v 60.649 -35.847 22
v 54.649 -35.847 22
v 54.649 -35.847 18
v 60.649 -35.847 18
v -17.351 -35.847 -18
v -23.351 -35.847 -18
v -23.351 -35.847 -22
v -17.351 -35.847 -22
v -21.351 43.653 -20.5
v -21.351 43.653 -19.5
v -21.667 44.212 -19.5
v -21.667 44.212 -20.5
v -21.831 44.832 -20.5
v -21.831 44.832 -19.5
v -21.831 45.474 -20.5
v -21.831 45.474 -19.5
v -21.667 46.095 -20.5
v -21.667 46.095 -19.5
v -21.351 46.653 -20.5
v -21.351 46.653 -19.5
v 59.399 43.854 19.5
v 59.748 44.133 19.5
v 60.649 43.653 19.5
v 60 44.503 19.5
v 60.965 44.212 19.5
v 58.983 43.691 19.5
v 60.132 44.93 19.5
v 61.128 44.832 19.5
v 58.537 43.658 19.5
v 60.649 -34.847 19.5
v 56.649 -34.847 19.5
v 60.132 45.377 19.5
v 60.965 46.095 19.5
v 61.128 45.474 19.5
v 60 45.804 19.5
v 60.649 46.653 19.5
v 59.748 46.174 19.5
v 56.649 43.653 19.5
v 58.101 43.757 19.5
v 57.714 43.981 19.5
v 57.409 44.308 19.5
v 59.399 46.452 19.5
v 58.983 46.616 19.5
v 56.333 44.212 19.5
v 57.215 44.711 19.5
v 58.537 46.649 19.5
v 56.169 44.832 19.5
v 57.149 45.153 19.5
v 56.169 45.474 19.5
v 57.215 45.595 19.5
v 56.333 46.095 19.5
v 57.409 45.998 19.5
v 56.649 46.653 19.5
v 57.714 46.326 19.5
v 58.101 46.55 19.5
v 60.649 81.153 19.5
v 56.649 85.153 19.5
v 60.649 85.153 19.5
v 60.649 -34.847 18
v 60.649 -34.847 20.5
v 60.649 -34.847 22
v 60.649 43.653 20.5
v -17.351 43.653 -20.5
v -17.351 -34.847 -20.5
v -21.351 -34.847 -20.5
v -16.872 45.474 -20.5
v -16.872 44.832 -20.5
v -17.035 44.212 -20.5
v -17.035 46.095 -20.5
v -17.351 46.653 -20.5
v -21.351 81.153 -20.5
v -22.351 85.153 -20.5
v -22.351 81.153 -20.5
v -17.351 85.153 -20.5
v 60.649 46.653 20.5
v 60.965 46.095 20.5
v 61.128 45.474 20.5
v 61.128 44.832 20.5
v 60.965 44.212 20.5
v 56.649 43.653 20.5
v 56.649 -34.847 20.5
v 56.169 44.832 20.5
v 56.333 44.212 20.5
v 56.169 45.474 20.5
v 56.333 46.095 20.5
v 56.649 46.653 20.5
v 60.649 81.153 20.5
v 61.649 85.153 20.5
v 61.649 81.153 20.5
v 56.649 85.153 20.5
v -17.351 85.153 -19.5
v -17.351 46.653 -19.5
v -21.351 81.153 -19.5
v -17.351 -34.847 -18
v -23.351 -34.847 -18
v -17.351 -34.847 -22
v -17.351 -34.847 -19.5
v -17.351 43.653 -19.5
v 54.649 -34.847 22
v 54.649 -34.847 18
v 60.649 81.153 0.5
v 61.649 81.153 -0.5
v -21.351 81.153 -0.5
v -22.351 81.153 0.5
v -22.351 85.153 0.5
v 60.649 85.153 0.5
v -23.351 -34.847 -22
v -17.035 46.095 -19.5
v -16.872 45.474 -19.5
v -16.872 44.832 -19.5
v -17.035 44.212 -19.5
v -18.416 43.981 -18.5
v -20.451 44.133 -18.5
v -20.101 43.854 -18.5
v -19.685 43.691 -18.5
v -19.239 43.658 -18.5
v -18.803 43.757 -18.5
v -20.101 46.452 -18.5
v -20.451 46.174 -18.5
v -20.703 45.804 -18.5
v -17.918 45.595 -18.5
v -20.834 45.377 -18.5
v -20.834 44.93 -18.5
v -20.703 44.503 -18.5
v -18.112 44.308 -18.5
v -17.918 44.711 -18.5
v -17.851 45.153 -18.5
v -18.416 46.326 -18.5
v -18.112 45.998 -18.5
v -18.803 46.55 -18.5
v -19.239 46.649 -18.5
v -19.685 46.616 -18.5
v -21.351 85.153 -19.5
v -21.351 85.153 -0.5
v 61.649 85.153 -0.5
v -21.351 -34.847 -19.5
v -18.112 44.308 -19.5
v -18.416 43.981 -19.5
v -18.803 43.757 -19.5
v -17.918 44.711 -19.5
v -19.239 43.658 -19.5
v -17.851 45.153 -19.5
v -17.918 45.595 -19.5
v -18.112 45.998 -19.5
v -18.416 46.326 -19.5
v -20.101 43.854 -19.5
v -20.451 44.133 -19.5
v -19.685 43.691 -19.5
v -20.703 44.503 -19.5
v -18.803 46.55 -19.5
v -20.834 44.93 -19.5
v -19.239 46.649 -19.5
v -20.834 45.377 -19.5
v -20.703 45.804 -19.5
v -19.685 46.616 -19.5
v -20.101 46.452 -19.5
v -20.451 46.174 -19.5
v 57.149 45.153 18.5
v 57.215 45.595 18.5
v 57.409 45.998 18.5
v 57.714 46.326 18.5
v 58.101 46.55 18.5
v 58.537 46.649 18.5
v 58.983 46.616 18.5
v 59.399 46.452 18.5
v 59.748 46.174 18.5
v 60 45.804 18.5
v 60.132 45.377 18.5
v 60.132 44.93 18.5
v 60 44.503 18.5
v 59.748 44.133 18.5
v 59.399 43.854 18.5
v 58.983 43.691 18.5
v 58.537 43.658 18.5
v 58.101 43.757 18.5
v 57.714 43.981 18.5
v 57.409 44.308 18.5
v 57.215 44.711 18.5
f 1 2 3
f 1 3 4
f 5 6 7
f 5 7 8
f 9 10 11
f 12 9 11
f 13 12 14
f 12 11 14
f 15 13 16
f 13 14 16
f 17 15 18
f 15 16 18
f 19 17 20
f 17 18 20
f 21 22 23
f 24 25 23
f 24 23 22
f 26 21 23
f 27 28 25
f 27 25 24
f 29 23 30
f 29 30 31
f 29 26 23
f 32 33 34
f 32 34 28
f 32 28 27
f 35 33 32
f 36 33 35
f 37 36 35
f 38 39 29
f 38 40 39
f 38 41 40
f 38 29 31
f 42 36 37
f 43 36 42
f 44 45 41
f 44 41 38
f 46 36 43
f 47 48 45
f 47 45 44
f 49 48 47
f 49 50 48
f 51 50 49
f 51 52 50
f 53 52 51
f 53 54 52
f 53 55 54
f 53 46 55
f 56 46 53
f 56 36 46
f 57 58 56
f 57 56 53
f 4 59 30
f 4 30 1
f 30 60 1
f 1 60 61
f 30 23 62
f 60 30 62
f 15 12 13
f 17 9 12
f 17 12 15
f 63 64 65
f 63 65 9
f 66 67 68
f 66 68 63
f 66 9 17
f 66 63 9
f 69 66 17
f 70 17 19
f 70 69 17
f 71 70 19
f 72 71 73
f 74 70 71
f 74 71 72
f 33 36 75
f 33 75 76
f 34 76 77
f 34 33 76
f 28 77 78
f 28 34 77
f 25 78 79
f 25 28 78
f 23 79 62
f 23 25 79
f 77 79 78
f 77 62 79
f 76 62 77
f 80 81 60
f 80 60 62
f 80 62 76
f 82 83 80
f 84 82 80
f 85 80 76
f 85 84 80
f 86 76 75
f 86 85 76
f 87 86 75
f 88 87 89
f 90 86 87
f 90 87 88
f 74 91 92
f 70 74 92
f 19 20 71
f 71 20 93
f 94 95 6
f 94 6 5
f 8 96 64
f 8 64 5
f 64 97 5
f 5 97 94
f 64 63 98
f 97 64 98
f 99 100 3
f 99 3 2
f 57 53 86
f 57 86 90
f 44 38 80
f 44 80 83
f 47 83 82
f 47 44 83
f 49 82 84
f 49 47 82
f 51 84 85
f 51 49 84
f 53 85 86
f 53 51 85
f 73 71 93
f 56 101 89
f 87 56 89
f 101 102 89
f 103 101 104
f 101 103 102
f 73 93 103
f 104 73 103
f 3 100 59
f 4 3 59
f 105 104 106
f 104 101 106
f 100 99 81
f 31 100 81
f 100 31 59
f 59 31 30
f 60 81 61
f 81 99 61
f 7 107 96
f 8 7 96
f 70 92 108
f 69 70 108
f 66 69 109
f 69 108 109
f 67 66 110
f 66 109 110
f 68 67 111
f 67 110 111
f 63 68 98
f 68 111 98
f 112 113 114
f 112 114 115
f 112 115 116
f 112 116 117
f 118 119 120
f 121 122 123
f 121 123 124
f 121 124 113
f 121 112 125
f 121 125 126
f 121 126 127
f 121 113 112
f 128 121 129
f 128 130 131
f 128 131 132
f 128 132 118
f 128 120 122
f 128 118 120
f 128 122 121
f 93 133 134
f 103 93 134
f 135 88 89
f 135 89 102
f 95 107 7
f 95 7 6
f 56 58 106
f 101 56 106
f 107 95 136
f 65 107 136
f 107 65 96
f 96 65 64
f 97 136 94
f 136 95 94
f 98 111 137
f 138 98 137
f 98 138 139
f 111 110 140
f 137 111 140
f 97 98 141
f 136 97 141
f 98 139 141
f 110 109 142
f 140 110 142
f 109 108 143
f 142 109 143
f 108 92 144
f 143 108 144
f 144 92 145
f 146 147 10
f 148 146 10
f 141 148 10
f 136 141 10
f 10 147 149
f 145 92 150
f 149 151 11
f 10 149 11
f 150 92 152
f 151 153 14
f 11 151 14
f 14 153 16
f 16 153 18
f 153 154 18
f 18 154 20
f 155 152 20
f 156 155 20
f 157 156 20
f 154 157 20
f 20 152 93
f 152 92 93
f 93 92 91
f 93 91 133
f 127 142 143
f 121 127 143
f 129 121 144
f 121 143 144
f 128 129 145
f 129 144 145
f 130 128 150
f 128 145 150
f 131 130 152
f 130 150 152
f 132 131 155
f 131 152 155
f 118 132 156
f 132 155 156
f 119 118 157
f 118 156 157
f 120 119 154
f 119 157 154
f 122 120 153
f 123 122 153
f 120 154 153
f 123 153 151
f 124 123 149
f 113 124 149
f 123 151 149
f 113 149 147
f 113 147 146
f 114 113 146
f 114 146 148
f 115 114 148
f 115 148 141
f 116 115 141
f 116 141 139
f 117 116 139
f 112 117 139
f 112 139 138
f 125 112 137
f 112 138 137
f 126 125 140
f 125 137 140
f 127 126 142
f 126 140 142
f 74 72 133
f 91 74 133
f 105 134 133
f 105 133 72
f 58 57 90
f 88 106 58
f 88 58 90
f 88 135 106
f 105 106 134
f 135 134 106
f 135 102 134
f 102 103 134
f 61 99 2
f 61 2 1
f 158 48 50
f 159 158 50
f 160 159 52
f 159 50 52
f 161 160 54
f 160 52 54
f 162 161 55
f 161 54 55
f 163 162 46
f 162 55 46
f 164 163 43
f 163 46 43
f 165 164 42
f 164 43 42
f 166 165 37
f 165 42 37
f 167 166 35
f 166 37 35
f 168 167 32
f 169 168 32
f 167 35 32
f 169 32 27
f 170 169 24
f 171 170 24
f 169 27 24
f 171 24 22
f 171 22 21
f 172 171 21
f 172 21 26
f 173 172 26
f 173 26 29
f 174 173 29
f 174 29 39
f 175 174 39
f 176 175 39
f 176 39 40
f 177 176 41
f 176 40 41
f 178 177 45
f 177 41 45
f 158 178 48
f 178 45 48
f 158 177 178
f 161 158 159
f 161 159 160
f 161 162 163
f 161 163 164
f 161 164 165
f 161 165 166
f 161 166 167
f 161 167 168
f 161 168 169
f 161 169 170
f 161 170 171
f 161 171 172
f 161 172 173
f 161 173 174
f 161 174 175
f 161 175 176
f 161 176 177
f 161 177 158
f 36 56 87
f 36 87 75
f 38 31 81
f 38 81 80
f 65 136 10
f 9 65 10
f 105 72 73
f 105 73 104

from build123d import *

# Parameters (mm, degrees)
EXTRUDE_2_DEPTH  = 1
SKETCH_2_R       = 1.5
EXTRUDE_3_DEPTH  = 1
EXTRUDE_4_DEPTH  = 1
SKETCH_4_R       = 1.5
EXTRUDE_5_DEPTH  = 1
SKETCH_5_W       = 82
SKETCH_5_H       = 4
EXTRUDE_6_DEPTH  = 0.5
SKETCH_6_W       = 21
SKETCH_6_H       = 4
EXTRUDE_7_DEPTH  = 1
SKETCH_7_W       = 21
SKETCH_7_H       = 4
EXTRUDE_8_DEPTH  = 1
SKETCH_8_W       = 6
SKETCH_8_H       = 4
EXTRUDE_9_DEPTH  = 1
SKETCH_9_W       = 6
SKETCH_9_H       = 4
EXTRUDE_10_DEPTH = 1


with BuildPart() as part:
    # 草图1 → 凸台-拉伸2 (new body)
    with BuildSketch(Plane.XY.offset(19.5)):
        with BuildLine():
            Line((56.648774872, 85.153357287), (60.648774872, 85.153357287))
            Line((60.648774872, 85.153357287), (60.648774872, 46.653357287))
            ThreePointArc((60.648774872, 46.653357287), (61.148774872, 45.153357287), (60.648774872, 43.653357287))
            Line((60.648774872, 43.653357287), (60.648774872, -34.846642713))
            Line((60.648774872, -34.846642713), (56.648774872, -34.846642713))
            Line((56.648774872, -34.846642713), (56.648774872, 43.653357287))
            ThreePointArc((56.648774872, 43.653357287), (56.148774872, 45.153357287), (56.648774872, 46.653357287))
            Line((56.648774872, 46.653357287), (56.648774872, 85.153357287))
        make_face()
    extrude(amount=EXTRUDE_2_DEPTH)

    # 草图2 → 凸台-拉伸3 (add)
    with BuildSketch(Plane(origin=(0, 0, 19.5), x_dir=(-1, 0, 0), z_dir=(0, 0, -1))):
        with Locations((-58.648774872, 45.153357287)):
            Circle(SKETCH_2_R)
    extrude(amount=EXTRUDE_3_DEPTH)



with BuildPart() as body_2:
    # 草图3 → 凸台-拉伸4 (new body)
    with BuildSketch(Plane(origin=(0, 0, -19.5), x_dir=(-1, 0, 0), z_dir=(0, 0, -1))):
        with BuildLine():
            Line((17.351225128, 43.653357287), (17.351225128, -34.846642713))
            Line((17.351225128, -34.846642713), (21.351225128, -34.846642713))
            Line((21.351225128, -34.846642713), (21.351225128, 43.653357287))
            ThreePointArc((21.351225128, 43.653357287), (21.851225128, 45.153357287), (21.351225128, 46.653357287))
            Line((21.351225128, 46.653357287), (21.351225128, 85.153357287))
            Line((21.351225128, 85.153357287), (17.351225128, 85.153357287))
            Line((17.351225128, 85.153357287), (17.351225128, 46.653357287))
            ThreePointArc((17.351225128, 46.653357287), (16.851225128, 45.153357287), (17.351225128, 43.653357287))
        make_face()
    extrude(amount=EXTRUDE_4_DEPTH)

    # 草图4 → 凸台-拉伸5 (add)
    with BuildSketch(Plane.XY.offset(-19.5)):
        with Locations((-19.351225128, 45.153357287)):
            Circle(SKETCH_4_R)
    extrude(amount=EXTRUDE_5_DEPTH)


with BuildPart() as body_3:
    # 草图5 → 凸台-拉伸6 (new body, symmetric)
    with BuildSketch(Plane.XY):
        with Locations((19.648774872, 83.153357287)):
            Rectangle(SKETCH_5_W, SKETCH_5_H)
    extrude(amount=EXTRUDE_6_DEPTH, both=True)


with BuildPart() as part_1:
    add(part.part)

    add(body_3.part)  # 凸台-拉伸7 merges body 3
    # 草图6 → 凸台-拉伸7 (add)
    with BuildSketch(Plane(origin=(60.648774872, 0, 0), x_dir=(0, 0, -1), z_dir=(1, 0, 0))):
        with Locations((-10, 83.153357287)):
            Rectangle(SKETCH_6_W, SKETCH_6_H)
    extrude(amount=EXTRUDE_7_DEPTH)


    add(body_2.part)  # 凸台-拉伸8 merges body 2
    # 草图7 → 凸台-拉伸8 (add)
    with BuildSketch(Plane.ZY.offset(21.351225128)):
        with Locations((-10, 83.153357287)):
            Rectangle(SKETCH_7_W, SKETCH_7_H)
    extrude(amount=EXTRUDE_8_DEPTH)

    # 草图8 → 凸台-拉伸9 (add)
    with BuildSketch(Plane.XZ.offset(34.846642713)):
        with Locations((-20.351225128, -20)):
            Rectangle(SKETCH_8_W, SKETCH_8_H)
    extrude(amount=EXTRUDE_9_DEPTH)

    # 草图9 → 凸台-拉伸10 (add)
    with BuildSketch(Plane.XZ.offset(34.846642713)):
        with Locations((57.648774872, 20)):
            Rectangle(SKETCH_9_W, SKETCH_9_H)
    extrude(amount=EXTRUDE_10_DEPTH)


solid = part_1.part
